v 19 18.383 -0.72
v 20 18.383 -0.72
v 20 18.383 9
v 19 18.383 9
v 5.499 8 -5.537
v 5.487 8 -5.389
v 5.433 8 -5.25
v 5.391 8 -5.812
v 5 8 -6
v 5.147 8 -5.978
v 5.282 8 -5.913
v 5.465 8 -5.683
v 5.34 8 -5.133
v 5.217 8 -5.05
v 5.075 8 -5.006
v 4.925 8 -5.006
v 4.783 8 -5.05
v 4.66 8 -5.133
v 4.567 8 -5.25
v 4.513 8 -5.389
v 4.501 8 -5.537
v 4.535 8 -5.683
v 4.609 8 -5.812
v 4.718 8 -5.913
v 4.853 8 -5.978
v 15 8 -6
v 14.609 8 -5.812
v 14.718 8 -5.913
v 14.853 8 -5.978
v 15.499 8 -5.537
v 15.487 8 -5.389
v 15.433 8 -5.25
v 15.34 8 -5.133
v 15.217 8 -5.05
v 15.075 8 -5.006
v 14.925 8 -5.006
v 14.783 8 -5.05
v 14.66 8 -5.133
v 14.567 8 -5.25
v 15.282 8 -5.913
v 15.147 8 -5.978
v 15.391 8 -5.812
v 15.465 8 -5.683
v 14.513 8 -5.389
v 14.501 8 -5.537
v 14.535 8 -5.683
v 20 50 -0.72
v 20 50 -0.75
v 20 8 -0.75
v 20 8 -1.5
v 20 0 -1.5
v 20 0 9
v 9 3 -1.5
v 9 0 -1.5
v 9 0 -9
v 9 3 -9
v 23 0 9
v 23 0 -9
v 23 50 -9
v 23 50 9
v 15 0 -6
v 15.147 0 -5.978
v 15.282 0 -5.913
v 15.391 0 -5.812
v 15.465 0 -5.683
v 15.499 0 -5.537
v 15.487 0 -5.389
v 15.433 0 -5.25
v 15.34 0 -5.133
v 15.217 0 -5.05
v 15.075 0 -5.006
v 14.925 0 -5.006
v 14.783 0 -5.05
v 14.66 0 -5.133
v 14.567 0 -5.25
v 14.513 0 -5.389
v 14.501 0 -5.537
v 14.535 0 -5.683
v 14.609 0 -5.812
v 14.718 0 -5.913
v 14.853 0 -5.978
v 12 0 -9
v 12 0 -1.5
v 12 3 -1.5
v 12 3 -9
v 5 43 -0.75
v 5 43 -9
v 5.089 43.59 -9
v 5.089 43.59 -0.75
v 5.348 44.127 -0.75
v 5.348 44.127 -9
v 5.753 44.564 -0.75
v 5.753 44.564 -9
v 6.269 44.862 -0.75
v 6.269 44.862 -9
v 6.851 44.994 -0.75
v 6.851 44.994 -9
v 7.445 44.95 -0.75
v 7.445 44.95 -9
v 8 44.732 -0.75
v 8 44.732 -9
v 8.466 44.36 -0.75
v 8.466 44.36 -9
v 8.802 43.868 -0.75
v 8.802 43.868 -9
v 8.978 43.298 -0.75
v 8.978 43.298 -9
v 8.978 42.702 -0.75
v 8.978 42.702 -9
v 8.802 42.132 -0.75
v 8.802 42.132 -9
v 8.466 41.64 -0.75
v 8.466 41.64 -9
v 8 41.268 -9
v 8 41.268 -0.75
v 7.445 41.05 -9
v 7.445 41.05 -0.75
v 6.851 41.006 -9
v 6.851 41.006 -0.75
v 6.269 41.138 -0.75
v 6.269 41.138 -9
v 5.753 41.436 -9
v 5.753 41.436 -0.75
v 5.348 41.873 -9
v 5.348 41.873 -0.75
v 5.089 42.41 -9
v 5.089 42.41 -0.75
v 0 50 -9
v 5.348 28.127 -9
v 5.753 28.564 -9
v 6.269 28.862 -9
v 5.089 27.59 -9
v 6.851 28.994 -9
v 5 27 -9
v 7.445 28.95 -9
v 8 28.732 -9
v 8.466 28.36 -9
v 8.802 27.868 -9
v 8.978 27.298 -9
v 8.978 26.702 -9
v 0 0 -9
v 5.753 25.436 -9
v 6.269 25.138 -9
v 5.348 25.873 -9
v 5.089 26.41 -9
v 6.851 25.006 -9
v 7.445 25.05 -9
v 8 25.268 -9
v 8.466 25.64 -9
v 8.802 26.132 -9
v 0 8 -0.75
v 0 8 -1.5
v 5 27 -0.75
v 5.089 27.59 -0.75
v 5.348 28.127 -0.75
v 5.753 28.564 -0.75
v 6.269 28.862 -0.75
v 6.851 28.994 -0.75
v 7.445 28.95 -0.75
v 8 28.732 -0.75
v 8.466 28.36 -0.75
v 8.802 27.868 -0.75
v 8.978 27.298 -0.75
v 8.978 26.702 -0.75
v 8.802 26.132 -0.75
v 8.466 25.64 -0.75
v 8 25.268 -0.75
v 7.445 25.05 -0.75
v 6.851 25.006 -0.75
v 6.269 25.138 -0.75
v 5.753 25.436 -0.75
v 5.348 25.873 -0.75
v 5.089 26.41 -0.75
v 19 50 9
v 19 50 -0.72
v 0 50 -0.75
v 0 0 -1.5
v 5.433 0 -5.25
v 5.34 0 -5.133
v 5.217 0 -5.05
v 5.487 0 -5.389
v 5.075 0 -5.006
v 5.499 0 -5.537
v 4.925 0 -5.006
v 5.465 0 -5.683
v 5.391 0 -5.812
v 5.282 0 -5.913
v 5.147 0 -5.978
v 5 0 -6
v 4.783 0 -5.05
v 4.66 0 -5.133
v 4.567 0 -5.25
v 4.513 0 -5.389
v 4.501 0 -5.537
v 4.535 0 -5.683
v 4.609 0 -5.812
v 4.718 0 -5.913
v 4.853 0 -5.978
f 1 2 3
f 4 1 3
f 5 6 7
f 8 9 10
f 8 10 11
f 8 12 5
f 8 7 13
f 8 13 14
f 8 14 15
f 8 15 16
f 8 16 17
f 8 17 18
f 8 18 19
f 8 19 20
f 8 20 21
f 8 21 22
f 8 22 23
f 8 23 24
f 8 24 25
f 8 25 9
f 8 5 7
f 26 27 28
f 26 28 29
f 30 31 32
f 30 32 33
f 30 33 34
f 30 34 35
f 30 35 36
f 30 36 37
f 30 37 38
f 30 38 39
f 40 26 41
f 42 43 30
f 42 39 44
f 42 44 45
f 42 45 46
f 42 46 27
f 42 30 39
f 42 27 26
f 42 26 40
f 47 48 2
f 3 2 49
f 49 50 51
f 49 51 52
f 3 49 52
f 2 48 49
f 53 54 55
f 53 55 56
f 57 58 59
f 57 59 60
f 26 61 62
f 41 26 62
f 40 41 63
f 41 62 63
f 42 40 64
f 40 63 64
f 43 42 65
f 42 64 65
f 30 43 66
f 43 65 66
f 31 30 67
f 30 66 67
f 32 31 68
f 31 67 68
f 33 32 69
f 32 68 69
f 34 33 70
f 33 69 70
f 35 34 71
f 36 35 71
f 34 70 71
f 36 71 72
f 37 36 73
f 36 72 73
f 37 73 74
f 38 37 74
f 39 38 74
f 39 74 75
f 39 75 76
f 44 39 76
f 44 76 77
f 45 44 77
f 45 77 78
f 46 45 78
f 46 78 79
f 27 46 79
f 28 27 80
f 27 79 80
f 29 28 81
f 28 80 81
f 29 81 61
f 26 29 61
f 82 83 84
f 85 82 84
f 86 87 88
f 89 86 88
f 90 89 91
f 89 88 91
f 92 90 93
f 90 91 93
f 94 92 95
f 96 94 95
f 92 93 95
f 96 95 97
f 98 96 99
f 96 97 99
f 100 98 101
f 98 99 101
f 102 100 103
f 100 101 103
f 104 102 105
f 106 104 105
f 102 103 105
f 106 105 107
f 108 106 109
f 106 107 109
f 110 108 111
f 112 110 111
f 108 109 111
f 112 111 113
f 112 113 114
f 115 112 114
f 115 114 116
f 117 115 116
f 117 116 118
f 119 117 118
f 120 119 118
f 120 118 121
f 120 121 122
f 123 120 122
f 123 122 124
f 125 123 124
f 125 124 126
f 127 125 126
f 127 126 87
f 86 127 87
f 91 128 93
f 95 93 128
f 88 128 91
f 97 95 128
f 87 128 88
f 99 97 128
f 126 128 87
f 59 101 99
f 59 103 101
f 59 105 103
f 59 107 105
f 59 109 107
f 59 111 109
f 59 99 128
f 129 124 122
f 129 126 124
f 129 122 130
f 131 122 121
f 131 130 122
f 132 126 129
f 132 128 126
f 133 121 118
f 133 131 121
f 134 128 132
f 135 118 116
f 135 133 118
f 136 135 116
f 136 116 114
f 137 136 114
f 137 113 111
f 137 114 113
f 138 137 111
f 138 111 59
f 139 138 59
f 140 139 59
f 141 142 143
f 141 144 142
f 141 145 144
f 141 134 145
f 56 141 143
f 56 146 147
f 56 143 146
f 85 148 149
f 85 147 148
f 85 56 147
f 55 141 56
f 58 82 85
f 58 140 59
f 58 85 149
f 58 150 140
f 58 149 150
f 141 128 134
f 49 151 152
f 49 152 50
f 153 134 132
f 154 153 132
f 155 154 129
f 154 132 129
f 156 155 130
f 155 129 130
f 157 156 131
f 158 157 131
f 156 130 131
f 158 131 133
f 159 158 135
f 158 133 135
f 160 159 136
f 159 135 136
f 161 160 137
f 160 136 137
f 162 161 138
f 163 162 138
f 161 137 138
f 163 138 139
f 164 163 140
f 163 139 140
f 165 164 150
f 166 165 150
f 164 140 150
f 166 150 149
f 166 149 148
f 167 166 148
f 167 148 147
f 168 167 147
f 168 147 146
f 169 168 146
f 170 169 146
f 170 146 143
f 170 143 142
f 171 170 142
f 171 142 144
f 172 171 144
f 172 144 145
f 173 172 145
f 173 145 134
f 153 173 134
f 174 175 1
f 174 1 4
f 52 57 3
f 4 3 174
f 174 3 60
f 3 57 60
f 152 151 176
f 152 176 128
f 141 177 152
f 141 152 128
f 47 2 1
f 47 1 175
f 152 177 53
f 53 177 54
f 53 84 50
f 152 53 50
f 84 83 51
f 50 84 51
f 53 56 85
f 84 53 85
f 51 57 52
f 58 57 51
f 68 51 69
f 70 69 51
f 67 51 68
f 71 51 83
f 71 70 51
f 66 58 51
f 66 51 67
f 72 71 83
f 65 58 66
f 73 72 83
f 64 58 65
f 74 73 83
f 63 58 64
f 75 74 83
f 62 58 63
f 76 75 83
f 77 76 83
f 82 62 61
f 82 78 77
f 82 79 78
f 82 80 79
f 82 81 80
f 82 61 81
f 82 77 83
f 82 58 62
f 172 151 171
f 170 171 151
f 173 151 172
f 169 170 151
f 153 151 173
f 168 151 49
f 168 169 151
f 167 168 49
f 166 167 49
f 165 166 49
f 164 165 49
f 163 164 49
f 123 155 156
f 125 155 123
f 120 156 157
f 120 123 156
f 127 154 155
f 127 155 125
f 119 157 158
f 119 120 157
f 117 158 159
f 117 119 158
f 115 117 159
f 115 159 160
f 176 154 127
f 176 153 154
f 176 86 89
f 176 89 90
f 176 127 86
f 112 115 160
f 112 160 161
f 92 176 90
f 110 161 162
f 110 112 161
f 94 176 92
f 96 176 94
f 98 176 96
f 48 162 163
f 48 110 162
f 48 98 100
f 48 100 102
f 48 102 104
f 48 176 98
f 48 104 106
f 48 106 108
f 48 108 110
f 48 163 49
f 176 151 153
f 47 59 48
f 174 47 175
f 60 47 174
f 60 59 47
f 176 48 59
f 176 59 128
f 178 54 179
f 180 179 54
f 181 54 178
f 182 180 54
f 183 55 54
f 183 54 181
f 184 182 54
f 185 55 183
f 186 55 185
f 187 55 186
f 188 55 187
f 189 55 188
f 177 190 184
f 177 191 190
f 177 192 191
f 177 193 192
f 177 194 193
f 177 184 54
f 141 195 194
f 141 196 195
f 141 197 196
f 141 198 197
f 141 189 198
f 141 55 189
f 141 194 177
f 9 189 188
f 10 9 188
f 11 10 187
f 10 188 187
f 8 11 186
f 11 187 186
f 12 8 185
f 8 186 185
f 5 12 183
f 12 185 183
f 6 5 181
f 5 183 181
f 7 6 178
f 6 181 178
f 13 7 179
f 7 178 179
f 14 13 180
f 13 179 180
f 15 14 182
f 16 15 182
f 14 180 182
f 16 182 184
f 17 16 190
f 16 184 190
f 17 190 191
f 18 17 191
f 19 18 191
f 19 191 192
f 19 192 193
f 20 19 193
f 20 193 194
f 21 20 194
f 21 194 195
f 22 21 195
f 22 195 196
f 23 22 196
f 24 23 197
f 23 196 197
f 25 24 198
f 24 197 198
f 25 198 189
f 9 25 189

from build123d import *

# Parameters (mm, degrees)
BOSS_EXTRUDE1_DEPTH = 50
SKETCH4_W           = 20
SKETCH4_H           = 1.5
CUT_EXTRUDE1_DEPTH  = 8
SKETCH5_R           = 0.5
CUT_EXTRUDE2_DEPTH  = 8
SKETCH6_W           = 3
SKETCH6_H           = 3
CUT_EXTRUDE3_DEPTH  = 7.5
SKETCH7_R           = 2
CUT_EXTRUDE4_DEPTH  = 9
SKETCH8_W           = 20
SKETCH8_H           = 42
CUT_EXTRUDE5_DEPTH  = 0.75
SKETCH9_W           = 9.72
SKETCH9_H           = 31.616710758
BOSS_EXTRUDE2_DEPTH = 1


with BuildPart() as part:
    # Sketch3 → Boss-Extrude1 (new body)
    with BuildSketch(Plane(origin=(0, 0, 0), x_dir=(1, 0, 0), z_dir=(0, 1, 0))):
        Polygon((0, 0), (0, 9), (23, 9), (23, -9), (20, -9), (20, 0), align=None)
    extrude(amount=BOSS_EXTRUDE1_DEPTH)

    # Sketch4 → Cut-Extrude1 (cut)
    with BuildSketch(Plane.XZ):
        with Locations((10, -0.75)):
            Rectangle(SKETCH4_W, SKETCH4_H)
    extrude(amount=-CUT_EXTRUDE1_DEPTH, mode=Mode.SUBTRACT)

    # Sketch5 → Cut-Extrude2 (cut)
    with BuildSketch(Plane.XZ):
        with Locations(Location((5, -5.5, 0), (0, 0, 270))):
            Circle(SKETCH5_R)
        with Locations(Location((15, -5.5, 0), (0, 0, 270))):
            Circle(SKETCH5_R)
    extrude(amount=-CUT_EXTRUDE2_DEPTH, mode=Mode.SUBTRACT)

    # Sketch6 → Cut-Extrude3 (cut)
    with BuildSketch(Plane.XY.offset(-1.5)):
        with Locations((10.5, 1.5)):
            Rectangle(SKETCH6_W, SKETCH6_H)
    extrude(amount=-CUT_EXTRUDE3_DEPTH, mode=Mode.SUBTRACT)

    # Sketch7 → Cut-Extrude4 (cut)
    with BuildSketch(Plane(origin=(0, 0, -9), x_dir=(-1, 0, 0), z_dir=(0, 0, -1))):
        with Locations((-7, 27)):
            Circle(SKETCH7_R)
        with Locations((-7, 43)):
            Circle(SKETCH7_R)
    extrude(amount=-CUT_EXTRUDE4_DEPTH, mode=Mode.SUBTRACT)

    # Sketch8 → Cut-Extrude5 (cut)
    with BuildSketch(Plane.XY):
        with Locations((10, 29)):
            Rectangle(SKETCH8_W, SKETCH8_H)
    extrude(amount=-CUT_EXTRUDE5_DEPTH, mode=Mode.SUBTRACT)

    # Sketch9 → Boss-Extrude2 (add)
    with BuildSketch(Plane.ZY.offset(-20)):
        with Locations((4.14, 34.191644621)):
            Rectangle(SKETCH9_W, SKETCH9_H)
    extrude(amount=BOSS_EXTRUDE2_DEPTH)


solid = part.part
